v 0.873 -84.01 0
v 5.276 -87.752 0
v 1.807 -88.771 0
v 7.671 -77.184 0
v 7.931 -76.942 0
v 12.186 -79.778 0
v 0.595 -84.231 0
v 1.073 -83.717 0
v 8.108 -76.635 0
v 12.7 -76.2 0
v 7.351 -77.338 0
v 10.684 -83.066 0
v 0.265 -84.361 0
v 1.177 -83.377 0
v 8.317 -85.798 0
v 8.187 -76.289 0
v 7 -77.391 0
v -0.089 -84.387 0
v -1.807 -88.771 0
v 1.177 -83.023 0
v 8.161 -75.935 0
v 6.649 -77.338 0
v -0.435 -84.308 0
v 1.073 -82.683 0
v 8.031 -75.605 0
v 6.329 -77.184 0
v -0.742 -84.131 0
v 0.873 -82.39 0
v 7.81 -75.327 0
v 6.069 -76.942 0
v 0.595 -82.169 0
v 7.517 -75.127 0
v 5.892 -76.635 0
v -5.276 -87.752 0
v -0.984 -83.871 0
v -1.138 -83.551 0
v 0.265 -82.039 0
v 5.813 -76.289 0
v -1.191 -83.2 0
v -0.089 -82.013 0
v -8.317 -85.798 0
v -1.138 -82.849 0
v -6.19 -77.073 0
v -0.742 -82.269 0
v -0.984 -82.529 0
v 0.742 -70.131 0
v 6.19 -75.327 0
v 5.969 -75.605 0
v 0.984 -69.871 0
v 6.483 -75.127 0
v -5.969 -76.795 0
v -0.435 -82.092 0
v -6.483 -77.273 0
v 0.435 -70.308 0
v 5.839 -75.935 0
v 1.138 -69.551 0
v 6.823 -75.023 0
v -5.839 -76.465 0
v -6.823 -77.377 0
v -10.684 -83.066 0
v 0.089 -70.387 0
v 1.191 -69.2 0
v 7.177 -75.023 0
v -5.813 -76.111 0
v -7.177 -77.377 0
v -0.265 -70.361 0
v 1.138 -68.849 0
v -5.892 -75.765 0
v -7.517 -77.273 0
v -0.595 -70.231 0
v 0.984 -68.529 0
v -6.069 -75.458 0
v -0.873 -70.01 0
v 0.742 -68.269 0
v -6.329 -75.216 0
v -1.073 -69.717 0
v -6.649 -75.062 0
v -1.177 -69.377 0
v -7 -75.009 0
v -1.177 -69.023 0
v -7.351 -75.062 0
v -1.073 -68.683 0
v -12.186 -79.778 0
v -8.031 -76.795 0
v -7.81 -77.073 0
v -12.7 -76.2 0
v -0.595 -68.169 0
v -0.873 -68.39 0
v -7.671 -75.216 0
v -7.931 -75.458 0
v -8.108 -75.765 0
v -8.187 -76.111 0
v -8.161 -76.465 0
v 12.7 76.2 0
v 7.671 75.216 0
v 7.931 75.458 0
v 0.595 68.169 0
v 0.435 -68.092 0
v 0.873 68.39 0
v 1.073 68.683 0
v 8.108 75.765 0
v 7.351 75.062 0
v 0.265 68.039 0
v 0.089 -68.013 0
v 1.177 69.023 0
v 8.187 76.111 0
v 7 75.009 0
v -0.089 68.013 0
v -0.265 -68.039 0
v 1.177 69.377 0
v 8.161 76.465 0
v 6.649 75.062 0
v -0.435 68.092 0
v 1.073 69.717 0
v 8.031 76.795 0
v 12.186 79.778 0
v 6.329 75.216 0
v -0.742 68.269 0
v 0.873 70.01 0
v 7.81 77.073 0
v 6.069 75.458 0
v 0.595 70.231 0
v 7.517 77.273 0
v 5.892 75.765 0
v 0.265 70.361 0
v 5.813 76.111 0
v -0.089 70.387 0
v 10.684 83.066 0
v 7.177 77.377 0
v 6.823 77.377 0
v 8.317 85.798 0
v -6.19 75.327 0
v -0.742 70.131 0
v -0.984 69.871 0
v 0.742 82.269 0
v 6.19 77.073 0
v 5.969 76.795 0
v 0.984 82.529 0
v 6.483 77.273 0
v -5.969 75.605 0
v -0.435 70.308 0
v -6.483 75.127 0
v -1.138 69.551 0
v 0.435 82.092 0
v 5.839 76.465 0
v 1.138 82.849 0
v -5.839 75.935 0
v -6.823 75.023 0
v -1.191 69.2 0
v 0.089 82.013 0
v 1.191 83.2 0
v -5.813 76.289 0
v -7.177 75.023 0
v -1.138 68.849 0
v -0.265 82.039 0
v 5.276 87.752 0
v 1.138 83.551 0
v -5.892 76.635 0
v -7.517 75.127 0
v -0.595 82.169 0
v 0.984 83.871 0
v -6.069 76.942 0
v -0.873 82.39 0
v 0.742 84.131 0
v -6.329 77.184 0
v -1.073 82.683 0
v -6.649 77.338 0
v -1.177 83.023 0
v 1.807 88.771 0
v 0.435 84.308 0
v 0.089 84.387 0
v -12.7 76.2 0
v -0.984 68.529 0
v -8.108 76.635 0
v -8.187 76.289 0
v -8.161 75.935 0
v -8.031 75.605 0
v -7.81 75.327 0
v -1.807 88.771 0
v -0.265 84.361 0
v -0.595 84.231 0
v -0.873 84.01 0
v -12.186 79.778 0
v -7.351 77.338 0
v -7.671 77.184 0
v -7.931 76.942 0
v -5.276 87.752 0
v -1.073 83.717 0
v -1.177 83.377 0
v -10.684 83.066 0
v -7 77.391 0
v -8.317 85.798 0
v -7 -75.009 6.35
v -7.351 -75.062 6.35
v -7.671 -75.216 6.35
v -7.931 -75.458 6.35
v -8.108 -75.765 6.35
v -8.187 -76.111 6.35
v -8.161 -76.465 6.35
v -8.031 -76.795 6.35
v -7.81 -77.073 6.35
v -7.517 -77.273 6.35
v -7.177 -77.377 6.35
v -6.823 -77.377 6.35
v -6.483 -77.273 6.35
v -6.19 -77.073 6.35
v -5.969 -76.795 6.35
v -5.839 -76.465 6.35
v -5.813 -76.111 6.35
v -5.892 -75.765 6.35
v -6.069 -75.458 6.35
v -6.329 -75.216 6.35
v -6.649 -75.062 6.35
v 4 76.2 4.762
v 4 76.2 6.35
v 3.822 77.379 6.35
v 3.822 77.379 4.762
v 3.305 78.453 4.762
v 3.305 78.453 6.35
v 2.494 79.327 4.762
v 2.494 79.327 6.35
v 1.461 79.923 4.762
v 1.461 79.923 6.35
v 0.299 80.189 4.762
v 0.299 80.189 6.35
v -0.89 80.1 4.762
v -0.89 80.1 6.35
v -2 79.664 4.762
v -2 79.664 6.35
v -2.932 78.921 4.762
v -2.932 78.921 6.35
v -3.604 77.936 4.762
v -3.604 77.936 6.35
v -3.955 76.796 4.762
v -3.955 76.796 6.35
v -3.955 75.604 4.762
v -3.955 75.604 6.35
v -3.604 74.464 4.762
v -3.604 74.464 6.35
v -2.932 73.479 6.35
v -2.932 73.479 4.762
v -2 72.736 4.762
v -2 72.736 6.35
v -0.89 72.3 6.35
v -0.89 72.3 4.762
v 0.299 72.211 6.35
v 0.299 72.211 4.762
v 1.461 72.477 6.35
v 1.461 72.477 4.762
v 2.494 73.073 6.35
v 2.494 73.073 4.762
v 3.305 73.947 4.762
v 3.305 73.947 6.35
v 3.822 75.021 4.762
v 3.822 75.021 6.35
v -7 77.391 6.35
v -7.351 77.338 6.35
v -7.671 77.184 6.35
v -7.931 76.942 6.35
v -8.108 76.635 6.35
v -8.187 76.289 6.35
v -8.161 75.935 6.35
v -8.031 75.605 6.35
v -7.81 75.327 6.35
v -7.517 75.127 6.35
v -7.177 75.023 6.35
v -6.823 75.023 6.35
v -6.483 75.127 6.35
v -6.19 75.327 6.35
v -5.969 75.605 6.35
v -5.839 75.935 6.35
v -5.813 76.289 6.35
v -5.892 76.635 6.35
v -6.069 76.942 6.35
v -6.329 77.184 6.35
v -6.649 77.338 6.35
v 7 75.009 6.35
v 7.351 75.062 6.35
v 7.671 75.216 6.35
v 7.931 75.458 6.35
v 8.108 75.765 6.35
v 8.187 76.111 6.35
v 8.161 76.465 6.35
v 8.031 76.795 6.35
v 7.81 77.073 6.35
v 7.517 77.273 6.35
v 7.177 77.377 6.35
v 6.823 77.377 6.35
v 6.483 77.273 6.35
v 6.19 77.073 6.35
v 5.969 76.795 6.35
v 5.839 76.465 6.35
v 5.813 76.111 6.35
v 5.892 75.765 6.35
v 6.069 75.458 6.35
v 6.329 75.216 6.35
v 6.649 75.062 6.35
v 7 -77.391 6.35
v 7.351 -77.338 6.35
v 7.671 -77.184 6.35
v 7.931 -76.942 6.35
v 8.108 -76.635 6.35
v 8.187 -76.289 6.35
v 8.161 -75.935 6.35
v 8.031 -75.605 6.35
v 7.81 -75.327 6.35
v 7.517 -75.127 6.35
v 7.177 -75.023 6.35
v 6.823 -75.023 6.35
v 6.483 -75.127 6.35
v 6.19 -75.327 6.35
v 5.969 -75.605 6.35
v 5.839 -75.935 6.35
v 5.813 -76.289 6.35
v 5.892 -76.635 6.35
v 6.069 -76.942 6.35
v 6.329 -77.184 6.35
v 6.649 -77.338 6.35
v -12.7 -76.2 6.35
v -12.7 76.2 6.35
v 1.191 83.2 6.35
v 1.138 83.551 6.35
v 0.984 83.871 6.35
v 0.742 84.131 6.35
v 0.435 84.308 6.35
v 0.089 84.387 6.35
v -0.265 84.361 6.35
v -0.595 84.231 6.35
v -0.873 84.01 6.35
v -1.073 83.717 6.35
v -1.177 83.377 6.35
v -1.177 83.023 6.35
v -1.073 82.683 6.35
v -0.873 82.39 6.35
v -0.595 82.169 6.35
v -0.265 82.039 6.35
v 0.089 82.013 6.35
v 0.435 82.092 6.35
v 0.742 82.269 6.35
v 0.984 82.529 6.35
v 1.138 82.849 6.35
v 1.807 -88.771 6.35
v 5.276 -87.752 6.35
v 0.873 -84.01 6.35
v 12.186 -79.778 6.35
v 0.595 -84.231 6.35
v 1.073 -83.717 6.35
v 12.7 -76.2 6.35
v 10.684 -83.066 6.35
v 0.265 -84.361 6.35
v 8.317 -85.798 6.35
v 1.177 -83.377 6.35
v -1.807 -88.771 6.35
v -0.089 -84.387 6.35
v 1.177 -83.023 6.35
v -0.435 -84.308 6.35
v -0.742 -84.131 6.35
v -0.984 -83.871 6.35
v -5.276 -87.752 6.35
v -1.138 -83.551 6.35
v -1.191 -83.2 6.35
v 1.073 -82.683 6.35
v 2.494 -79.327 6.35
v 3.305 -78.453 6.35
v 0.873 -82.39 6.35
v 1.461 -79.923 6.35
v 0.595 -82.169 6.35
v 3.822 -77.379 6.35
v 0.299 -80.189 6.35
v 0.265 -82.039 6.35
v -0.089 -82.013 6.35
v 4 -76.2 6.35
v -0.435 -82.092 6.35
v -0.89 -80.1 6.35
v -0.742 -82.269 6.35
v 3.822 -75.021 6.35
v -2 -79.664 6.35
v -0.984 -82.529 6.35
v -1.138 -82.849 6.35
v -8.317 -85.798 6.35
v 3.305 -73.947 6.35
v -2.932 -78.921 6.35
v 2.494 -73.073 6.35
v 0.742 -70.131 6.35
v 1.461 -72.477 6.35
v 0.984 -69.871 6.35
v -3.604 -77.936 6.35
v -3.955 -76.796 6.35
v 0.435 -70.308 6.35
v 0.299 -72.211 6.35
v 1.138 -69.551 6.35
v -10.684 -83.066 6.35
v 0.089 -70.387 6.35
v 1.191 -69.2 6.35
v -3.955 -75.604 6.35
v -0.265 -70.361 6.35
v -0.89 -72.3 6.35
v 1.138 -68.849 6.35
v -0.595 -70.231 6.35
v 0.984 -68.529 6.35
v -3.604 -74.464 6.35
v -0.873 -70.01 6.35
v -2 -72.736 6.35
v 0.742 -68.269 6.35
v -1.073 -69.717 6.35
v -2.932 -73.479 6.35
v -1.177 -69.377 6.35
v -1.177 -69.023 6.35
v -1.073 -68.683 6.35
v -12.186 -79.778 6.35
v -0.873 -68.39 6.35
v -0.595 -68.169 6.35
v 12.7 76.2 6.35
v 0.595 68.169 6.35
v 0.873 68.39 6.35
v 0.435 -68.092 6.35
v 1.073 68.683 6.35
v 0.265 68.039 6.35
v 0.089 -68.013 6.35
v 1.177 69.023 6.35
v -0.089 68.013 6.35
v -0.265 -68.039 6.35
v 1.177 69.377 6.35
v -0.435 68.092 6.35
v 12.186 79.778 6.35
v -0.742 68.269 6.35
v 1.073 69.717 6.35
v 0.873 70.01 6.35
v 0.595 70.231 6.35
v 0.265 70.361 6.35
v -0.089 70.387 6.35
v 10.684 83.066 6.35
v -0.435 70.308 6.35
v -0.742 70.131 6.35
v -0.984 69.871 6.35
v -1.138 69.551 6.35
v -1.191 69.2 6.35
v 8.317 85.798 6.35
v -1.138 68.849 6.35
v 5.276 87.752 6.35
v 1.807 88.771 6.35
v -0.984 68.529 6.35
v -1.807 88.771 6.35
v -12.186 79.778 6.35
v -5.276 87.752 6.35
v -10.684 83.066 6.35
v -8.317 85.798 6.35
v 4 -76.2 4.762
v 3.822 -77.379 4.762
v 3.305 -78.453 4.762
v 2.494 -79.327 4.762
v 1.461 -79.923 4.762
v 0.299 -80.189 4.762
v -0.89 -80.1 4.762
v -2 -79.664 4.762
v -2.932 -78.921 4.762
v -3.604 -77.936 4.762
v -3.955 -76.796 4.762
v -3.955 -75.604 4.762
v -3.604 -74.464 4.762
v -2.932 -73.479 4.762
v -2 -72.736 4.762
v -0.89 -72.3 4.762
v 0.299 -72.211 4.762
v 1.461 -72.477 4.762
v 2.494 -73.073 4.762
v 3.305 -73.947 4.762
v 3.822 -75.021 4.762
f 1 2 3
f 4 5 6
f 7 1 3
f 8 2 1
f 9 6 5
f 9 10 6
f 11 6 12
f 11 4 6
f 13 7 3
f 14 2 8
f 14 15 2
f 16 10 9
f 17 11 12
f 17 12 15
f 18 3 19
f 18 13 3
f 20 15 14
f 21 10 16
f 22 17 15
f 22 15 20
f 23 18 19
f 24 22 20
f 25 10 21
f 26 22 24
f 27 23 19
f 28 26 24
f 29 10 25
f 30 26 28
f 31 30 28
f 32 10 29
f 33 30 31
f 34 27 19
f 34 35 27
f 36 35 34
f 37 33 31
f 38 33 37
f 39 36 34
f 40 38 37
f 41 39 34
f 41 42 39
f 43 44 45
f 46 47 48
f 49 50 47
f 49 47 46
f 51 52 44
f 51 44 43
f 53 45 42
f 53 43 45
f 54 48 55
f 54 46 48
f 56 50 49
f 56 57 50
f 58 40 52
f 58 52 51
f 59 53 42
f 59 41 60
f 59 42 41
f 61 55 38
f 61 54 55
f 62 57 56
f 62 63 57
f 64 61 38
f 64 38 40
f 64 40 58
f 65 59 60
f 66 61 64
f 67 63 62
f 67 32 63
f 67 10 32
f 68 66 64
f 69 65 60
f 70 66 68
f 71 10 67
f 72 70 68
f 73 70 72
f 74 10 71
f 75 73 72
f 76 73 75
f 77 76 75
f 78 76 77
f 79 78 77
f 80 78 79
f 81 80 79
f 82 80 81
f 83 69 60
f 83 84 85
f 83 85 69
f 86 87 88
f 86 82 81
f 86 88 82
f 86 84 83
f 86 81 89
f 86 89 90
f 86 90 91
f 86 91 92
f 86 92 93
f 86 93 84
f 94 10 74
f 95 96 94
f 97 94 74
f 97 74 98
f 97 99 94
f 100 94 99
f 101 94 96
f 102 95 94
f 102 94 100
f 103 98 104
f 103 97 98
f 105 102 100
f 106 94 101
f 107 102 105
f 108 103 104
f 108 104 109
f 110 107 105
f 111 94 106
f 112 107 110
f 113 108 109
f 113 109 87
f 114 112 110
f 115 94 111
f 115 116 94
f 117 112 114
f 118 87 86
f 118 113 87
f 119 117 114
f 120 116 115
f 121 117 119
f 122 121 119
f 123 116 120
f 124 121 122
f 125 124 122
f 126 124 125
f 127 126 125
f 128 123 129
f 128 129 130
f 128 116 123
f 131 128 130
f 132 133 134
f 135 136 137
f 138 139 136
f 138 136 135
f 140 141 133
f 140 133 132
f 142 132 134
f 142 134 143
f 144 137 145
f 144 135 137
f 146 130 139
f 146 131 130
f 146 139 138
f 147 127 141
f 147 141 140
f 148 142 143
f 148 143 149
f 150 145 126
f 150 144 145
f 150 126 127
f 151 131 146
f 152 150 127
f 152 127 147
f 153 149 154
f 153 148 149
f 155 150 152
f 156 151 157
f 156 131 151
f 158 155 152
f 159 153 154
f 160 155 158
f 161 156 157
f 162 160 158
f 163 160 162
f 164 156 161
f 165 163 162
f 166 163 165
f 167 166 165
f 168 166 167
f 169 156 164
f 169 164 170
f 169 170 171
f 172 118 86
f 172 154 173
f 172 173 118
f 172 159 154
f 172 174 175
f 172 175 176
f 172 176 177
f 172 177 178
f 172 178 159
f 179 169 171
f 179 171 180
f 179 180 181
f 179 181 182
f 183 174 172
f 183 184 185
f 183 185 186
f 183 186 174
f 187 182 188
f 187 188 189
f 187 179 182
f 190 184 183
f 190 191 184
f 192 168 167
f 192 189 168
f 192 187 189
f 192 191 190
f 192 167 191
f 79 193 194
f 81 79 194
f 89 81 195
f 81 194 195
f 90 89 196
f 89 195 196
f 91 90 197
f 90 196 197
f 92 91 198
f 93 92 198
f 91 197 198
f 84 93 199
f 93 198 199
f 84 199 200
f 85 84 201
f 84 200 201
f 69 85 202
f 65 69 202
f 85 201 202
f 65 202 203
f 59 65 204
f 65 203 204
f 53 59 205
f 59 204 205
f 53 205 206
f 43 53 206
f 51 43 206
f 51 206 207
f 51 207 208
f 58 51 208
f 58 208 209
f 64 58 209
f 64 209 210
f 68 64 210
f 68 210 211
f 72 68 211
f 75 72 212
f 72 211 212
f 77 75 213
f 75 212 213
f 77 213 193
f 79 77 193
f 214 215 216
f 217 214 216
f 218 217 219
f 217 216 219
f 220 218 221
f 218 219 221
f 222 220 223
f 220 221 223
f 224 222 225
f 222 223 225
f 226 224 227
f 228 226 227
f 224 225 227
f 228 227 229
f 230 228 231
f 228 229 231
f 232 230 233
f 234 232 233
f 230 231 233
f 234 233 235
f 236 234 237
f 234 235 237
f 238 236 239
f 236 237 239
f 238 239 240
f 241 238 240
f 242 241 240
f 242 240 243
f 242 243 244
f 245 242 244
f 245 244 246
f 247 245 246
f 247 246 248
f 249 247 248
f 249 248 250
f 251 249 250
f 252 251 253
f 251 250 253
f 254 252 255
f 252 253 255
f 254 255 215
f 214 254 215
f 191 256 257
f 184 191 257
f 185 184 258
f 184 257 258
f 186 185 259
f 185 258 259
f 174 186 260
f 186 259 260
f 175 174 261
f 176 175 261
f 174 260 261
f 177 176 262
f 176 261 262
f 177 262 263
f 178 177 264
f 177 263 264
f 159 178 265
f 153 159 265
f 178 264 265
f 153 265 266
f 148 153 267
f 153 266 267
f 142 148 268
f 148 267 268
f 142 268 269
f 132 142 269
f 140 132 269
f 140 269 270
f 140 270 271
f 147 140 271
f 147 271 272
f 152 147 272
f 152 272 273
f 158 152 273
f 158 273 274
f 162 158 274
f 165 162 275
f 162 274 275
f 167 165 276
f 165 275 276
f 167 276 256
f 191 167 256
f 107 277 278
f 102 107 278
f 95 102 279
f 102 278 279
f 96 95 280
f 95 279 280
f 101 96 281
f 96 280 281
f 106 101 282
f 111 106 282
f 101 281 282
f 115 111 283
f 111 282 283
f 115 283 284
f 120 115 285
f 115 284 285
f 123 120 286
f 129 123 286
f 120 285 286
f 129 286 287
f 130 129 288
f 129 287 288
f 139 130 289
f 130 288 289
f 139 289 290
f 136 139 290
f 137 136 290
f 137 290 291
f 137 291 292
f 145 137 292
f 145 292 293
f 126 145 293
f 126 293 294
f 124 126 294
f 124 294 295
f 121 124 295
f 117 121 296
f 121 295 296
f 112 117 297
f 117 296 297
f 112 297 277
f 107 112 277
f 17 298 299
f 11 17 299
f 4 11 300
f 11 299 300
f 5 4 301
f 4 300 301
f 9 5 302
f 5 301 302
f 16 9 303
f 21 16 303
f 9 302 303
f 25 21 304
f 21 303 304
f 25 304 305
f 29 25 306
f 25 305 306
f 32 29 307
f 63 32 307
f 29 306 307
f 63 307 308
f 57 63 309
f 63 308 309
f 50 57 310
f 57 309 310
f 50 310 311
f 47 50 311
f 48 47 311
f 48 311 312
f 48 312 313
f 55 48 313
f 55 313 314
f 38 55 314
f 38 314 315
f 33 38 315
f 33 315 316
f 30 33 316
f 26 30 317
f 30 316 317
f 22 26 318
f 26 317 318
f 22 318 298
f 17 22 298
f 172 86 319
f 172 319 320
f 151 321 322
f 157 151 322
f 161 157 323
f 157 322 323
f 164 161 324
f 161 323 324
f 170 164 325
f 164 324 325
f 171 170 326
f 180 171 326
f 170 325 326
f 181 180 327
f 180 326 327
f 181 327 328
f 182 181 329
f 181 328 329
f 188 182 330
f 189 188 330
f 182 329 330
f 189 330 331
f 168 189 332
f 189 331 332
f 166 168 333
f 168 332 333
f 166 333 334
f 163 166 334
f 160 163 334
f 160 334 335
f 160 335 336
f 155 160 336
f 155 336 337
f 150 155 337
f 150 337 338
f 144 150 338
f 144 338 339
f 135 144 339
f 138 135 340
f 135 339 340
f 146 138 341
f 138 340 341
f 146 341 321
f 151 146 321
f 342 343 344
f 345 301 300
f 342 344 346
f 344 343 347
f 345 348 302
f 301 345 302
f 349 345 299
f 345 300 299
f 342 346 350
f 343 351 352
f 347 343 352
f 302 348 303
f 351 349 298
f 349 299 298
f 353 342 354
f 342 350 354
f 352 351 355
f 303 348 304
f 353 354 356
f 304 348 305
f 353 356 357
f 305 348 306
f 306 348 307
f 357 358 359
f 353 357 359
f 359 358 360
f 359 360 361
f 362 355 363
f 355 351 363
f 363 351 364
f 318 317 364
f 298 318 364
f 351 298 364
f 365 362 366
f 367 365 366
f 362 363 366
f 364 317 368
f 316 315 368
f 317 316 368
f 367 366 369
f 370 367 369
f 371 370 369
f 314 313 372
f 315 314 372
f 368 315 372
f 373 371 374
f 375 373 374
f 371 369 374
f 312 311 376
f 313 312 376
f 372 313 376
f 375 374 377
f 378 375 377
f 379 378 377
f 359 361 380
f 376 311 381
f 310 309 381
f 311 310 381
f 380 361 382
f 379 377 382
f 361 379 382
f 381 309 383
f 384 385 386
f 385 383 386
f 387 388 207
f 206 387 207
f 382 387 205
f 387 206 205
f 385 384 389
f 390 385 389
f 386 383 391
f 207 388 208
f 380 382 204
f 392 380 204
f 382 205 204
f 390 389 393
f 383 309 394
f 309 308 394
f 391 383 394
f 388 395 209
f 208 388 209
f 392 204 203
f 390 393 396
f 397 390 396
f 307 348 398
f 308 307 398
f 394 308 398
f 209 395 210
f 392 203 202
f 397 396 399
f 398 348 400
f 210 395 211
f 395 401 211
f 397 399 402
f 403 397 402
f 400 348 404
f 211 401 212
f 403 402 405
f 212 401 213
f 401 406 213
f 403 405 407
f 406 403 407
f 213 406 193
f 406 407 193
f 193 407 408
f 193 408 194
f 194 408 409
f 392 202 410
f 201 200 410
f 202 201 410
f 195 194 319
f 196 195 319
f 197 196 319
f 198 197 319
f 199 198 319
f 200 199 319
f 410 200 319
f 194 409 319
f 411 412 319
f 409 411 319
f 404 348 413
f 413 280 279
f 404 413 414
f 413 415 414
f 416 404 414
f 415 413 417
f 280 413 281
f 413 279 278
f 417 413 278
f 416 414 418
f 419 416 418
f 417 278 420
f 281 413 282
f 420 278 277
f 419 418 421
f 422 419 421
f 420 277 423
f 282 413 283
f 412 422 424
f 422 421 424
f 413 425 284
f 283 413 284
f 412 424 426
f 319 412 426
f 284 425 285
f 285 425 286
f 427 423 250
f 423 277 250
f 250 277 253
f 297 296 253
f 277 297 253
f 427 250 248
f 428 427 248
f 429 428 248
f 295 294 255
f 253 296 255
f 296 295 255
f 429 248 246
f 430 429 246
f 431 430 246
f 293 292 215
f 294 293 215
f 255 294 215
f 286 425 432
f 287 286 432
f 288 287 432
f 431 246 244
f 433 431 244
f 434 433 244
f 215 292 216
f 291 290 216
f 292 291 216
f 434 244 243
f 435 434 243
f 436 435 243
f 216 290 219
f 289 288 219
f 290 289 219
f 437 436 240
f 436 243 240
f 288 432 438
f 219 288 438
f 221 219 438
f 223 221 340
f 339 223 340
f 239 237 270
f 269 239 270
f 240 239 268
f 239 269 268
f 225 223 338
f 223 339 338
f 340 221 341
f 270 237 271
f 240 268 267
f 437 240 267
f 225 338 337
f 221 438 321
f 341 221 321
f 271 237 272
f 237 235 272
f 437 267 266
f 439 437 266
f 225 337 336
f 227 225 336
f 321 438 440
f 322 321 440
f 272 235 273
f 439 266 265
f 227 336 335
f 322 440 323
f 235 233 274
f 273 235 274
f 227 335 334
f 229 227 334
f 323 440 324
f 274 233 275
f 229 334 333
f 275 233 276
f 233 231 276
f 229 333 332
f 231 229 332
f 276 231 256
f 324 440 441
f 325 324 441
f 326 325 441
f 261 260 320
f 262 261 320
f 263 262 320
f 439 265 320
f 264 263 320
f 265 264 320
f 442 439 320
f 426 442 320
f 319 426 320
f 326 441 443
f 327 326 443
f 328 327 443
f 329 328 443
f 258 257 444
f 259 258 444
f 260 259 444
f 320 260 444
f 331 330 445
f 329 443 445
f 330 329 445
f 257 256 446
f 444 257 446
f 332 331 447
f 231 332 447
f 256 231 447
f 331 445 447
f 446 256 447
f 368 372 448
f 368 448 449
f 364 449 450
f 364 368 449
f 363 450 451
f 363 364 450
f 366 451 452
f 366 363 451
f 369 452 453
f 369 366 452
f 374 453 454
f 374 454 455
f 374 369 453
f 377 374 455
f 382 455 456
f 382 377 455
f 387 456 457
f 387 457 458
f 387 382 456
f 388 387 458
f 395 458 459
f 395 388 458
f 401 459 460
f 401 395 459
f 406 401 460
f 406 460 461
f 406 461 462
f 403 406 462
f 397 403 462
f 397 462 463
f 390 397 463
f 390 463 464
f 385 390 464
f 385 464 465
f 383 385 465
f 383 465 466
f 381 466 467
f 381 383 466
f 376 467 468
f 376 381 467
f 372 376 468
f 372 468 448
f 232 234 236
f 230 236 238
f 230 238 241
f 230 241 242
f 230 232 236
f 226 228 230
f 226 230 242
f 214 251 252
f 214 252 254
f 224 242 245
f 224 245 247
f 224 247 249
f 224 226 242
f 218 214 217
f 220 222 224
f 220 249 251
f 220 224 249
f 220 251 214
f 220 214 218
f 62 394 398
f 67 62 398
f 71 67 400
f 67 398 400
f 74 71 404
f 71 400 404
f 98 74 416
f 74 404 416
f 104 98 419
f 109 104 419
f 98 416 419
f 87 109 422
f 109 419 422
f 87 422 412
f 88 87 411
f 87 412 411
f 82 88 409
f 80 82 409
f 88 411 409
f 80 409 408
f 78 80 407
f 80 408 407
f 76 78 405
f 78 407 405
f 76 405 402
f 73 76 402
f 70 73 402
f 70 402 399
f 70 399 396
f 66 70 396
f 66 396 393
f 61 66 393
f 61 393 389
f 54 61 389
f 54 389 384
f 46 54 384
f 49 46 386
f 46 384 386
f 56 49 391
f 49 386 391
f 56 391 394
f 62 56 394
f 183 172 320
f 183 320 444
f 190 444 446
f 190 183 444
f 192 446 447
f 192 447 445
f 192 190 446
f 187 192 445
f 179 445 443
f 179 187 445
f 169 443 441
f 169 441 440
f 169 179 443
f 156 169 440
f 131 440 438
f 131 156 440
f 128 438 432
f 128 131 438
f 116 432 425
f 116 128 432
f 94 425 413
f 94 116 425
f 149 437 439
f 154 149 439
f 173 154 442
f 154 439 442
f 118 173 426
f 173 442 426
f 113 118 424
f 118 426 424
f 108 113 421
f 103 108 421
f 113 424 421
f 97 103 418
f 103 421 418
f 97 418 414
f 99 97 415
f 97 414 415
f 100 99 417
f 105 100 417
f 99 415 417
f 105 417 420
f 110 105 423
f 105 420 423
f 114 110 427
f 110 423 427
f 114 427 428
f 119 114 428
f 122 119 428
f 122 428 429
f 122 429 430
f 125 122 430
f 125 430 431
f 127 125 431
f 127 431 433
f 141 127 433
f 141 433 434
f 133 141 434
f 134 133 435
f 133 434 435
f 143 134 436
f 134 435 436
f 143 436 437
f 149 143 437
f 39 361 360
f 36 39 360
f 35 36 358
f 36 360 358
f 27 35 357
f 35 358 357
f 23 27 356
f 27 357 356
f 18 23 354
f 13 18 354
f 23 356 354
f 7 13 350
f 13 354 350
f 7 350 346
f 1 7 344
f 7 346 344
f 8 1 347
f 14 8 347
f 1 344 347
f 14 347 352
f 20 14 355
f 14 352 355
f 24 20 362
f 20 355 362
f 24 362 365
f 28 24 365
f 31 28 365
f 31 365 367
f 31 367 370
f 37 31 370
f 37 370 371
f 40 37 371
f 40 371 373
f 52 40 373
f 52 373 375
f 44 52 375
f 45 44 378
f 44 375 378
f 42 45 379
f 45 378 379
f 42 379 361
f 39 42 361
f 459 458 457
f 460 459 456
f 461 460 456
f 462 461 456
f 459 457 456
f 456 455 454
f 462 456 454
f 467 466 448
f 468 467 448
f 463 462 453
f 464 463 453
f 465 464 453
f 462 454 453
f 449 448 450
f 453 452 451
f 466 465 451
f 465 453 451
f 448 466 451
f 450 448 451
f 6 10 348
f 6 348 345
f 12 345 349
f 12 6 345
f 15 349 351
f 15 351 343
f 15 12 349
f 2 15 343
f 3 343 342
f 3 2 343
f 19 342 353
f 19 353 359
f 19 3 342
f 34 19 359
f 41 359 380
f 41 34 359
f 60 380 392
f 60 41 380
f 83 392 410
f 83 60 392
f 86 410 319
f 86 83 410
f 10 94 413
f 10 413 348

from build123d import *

# Parameters (mm, degrees)
BOSS_EXTRUDE1_DEPTH          = 6.35
SKETCH2_R                    = 4
CUT_EXTRUDE1_DEPTH           = 1.5875
SKETCH3_R                    = 1.190625
CUT_EXTRUDE2_DEPTH           = 6.35
CIRPATTERN1_COUNT            = 4
CIRPATTERN2_COPY_1_SKETCH_R  = 1.190625
CIRPATTERN2_COPY_1_DEPTH     = 6.35
CIRPATTERN2_COPY_2_SKETCH_R  = 1.190625
CIRPATTERN2_COPY_2_DEPTH     = 6.35
CIRPATTERN2_COPY_3_SKETCH_R  = 1.190625
CIRPATTERN2_COPY_3_DEPTH     = 6.35
CIRPATTERN2_COPY_4_SKETCH_R  = 1.190625
CIRPATTERN2_COPY_4_DEPTH     = 6.35
CIRPATTERN2_COPY_5_SKETCH_R  = 1.190625
CIRPATTERN2_COPY_5_DEPTH     = 6.35
CIRPATTERN2_COPY_6_SKETCH_R  = 1.190625
CIRPATTERN2_COPY_6_DEPTH     = 6.35
CIRPATTERN2_COPY_7_SKETCH_R  = 1.190625
CIRPATTERN2_COPY_7_DEPTH     = 6.35
CIRPATTERN2_COPY_8_SKETCH_R  = 1.190625
CIRPATTERN2_COPY_8_DEPTH     = 6.35
CIRPATTERN2_COPY_9_SKETCH_R  = 1.190625
CIRPATTERN2_COPY_9_DEPTH     = 6.35
CIRPATTERN2_COPY_10_SKETCH_R = 1.190625
CIRPATTERN2_COPY_10_DEPTH    = 6.35
CIRPATTERN2_COPY_11_SKETCH_R = 1.190625
CIRPATTERN2_COPY_11_DEPTH    = 6.35
CIRPATTERN2_COPY_12_SKETCH_R = 1.190625
CIRPATTERN2_COPY_12_DEPTH    = 6.35


with BuildPart() as part:
    # Sketch1 → Boss-Extrude1 (new body)
    with BuildSketch(Plane.XY):
        with BuildLine():
            Line((-12.7, -76.2), (-12.7, 76.2))
            ThreePointArc((-12.7, 76.2), (0, 88.9), (12.7, 76.2))
            Line((12.7, 76.2), (12.7, -76.2))
            ThreePointArc((12.7, -76.2), (0, -88.9), (-12.7, -76.2))
        make_face()
    extrude(amount=BOSS_EXTRUDE1_DEPTH)

    # Sketch2 → Cut-Extrude1 (cut)
    with BuildSketch(Plane.XY.offset(6.35)):
        with Locations((0, 76.2)):
            Circle(SKETCH2_R)
    cut_extrude1 = extrude(amount=-CUT_EXTRUDE1_DEPTH, mode=Mode.SUBTRACT)

    # Mirror1: Cut-Extrude1 across plane
    add(cut_extrude1.mirror(Plane.ZX), mode=Mode.SUBTRACT)

    # Sketch3 → Cut-Extrude2 (cut)
    with BuildSketch(Plane.XY.offset(6.35)):
        with Locations((0, 83.2)):
            Circle(SKETCH3_R)
        with Locations((0, -69.2)):
            Circle(SKETCH3_R)
    cut_extrude2 = extrude(amount=-CUT_EXTRUDE2_DEPTH, mode=Mode.SUBTRACT)

    # CirPattern1: Cut-Extrude2 ×4 about axis
    cirpattern1_axis = Axis((0, 76.2, 0), (0, 0, 1))
    for i in range(1, CIRPATTERN1_COUNT):
        add(cut_extrude2.rotate(cirpattern1_axis, i * 360 / CIRPATTERN1_COUNT), mode=Mode.SUBTRACT)

    # CirPattern2 copy 1 sketch → CirPattern2 copy 1 (cut)
    with BuildSketch(Plane(origin=(-152.4, 0, 6.35), x_dir=(-1, 0, 0), z_dir=(0, 0, 1))):
        with Locations((0, 83.2)):
            Circle(CIRPATTERN2_COPY_1_SKETCH_R)
        with Locations((0, -69.2)):
            Circle(CIRPATTERN2_COPY_1_SKETCH_R)
    extrude(amount=-CIRPATTERN2_COPY_1_DEPTH, mode=Mode.SUBTRACT)

    # CirPattern2 copy 2 sketch → CirPattern2 copy 2 (cut)
    with BuildSketch(Plane(origin=(-76.2, -228.6, 6.35), x_dir=(0, -1, 0), z_dir=(0, 0, 1))):
        with Locations((0, 83.2)):
            Circle(CIRPATTERN2_COPY_2_SKETCH_R)
        with Locations((0, -69.2)):
            Circle(CIRPATTERN2_COPY_2_SKETCH_R)
    extrude(amount=-CIRPATTERN2_COPY_2_DEPTH, mode=Mode.SUBTRACT)

    # CirPattern2 copy 3 sketch → CirPattern2 copy 3 (cut)
    with BuildSketch(Plane(origin=(152.4, -152.4, 6.35), x_dir=(1, 0, 0), z_dir=(0, 0, 1))):
        with Locations((0, 83.2)):
            Circle(CIRPATTERN2_COPY_3_SKETCH_R)
        with Locations((0, -69.2)):
            Circle(CIRPATTERN2_COPY_3_SKETCH_R)
    extrude(amount=-CIRPATTERN2_COPY_3_DEPTH, mode=Mode.SUBTRACT)

    # CirPattern2 copy 4 sketch → CirPattern2 copy 4 (cut)
    with BuildSketch(Plane(origin=(-228.6, -76.2, 6.35), x_dir=(0, -1, 0), z_dir=(0, 0, 1))):
        with Locations((0, 83.2)):
            Circle(CIRPATTERN2_COPY_4_SKETCH_R)
        with Locations((0, -69.2)):
            Circle(CIRPATTERN2_COPY_4_SKETCH_R)
    extrude(amount=-CIRPATTERN2_COPY_4_DEPTH, mode=Mode.SUBTRACT)

    # CirPattern2 copy 5 sketch → CirPattern2 copy 5 (cut)
    with BuildSketch(Plane(origin=(0, -304.8, 6.35), x_dir=(1, 0, 0), z_dir=(0, 0, 1))):
        with Locations((0, 83.2)):
            Circle(CIRPATTERN2_COPY_5_SKETCH_R)
        with Locations((0, -69.2)):
            Circle(CIRPATTERN2_COPY_5_SKETCH_R)
    extrude(amount=-CIRPATTERN2_COPY_5_DEPTH, mode=Mode.SUBTRACT)

    # CirPattern2 copy 6 sketch → CirPattern2 copy 6 (cut)
    with BuildSketch(Plane(origin=(228.6, -76.2, 6.35), x_dir=(0, 1, 0), z_dir=(0, 0, 1))):
        with Locations((0, 83.2)):
            Circle(CIRPATTERN2_COPY_6_SKETCH_R)
        with Locations((0, -69.2)):
            Circle(CIRPATTERN2_COPY_6_SKETCH_R)
    extrude(amount=-CIRPATTERN2_COPY_6_DEPTH, mode=Mode.SUBTRACT)

    # CirPattern2 copy 7 sketch → CirPattern2 copy 7 (cut)
    with BuildSketch(Plane(origin=(-152.4, -152.4, 6.35), x_dir=(1, 0, 0), z_dir=(0, 0, 1))):
        with Locations((0, 83.2)):
            Circle(CIRPATTERN2_COPY_7_SKETCH_R)
        with Locations((0, -69.2)):
            Circle(CIRPATTERN2_COPY_7_SKETCH_R)
    extrude(amount=-CIRPATTERN2_COPY_7_DEPTH, mode=Mode.SUBTRACT)

    # CirPattern2 copy 8 sketch → CirPattern2 copy 8 (cut)
    with BuildSketch(Plane(origin=(76.2, -228.6, 6.35), x_dir=(0, 1, 0), z_dir=(0, 0, 1))):
        with Locations((0, 83.2)):
            Circle(CIRPATTERN2_COPY_8_SKETCH_R)
        with Locations((0, -69.2)):
            Circle(CIRPATTERN2_COPY_8_SKETCH_R)
    extrude(amount=-CIRPATTERN2_COPY_8_DEPTH, mode=Mode.SUBTRACT)

    # CirPattern2 copy 9 sketch → CirPattern2 copy 9 (cut)
    with BuildSketch(Plane(origin=(152.4, 0, 6.35), x_dir=(-1, 0, 0), z_dir=(0, 0, 1))):
        with Locations((0, 83.2)):
            Circle(CIRPATTERN2_COPY_9_SKETCH_R)
        with Locations((0, -69.2)):
            Circle(CIRPATTERN2_COPY_9_SKETCH_R)
    extrude(amount=-CIRPATTERN2_COPY_9_DEPTH, mode=Mode.SUBTRACT)

    # CirPattern2 copy 10 sketch → CirPattern2 copy 10 (cut)
    with BuildSketch(Plane(origin=(-76.2, -76.2, 6.35), x_dir=(0, 1, 0), z_dir=(0, 0, 1))):
        with Locations((0, 83.2)):
            Circle(CIRPATTERN2_COPY_10_SKETCH_R)
        with Locations((0, -69.2)):
            Circle(CIRPATTERN2_COPY_10_SKETCH_R)
    extrude(amount=-CIRPATTERN2_COPY_10_DEPTH, mode=Mode.SUBTRACT)

    # CirPattern2 copy 11 sketch → CirPattern2 copy 11 (cut)
    with BuildSketch(Plane(origin=(0, -152.4, 6.35), x_dir=(-1, 0, 0), z_dir=(0, 0, 1))):
        with Locations((0, 83.2)):
            Circle(CIRPATTERN2_COPY_11_SKETCH_R)
        with Locations((0, -69.2)):
            Circle(CIRPATTERN2_COPY_11_SKETCH_R)
    extrude(amount=-CIRPATTERN2_COPY_11_DEPTH, mode=Mode.SUBTRACT)

    # CirPattern2 copy 12 sketch → CirPattern2 copy 12 (cut)
    with BuildSketch(Plane(origin=(76.2, -76.2, 6.35), x_dir=(0, -1, 0), z_dir=(0, 0, 1))):
        with Locations((0, 83.2)):
            Circle(CIRPATTERN2_COPY_12_SKETCH_R)
        with Locations((0, -69.2)):
            Circle(CIRPATTERN2_COPY_12_SKETCH_R)
    extrude(amount=-CIRPATTERN2_COPY_12_DEPTH, mode=Mode.SUBTRACT)


solid = part.part
